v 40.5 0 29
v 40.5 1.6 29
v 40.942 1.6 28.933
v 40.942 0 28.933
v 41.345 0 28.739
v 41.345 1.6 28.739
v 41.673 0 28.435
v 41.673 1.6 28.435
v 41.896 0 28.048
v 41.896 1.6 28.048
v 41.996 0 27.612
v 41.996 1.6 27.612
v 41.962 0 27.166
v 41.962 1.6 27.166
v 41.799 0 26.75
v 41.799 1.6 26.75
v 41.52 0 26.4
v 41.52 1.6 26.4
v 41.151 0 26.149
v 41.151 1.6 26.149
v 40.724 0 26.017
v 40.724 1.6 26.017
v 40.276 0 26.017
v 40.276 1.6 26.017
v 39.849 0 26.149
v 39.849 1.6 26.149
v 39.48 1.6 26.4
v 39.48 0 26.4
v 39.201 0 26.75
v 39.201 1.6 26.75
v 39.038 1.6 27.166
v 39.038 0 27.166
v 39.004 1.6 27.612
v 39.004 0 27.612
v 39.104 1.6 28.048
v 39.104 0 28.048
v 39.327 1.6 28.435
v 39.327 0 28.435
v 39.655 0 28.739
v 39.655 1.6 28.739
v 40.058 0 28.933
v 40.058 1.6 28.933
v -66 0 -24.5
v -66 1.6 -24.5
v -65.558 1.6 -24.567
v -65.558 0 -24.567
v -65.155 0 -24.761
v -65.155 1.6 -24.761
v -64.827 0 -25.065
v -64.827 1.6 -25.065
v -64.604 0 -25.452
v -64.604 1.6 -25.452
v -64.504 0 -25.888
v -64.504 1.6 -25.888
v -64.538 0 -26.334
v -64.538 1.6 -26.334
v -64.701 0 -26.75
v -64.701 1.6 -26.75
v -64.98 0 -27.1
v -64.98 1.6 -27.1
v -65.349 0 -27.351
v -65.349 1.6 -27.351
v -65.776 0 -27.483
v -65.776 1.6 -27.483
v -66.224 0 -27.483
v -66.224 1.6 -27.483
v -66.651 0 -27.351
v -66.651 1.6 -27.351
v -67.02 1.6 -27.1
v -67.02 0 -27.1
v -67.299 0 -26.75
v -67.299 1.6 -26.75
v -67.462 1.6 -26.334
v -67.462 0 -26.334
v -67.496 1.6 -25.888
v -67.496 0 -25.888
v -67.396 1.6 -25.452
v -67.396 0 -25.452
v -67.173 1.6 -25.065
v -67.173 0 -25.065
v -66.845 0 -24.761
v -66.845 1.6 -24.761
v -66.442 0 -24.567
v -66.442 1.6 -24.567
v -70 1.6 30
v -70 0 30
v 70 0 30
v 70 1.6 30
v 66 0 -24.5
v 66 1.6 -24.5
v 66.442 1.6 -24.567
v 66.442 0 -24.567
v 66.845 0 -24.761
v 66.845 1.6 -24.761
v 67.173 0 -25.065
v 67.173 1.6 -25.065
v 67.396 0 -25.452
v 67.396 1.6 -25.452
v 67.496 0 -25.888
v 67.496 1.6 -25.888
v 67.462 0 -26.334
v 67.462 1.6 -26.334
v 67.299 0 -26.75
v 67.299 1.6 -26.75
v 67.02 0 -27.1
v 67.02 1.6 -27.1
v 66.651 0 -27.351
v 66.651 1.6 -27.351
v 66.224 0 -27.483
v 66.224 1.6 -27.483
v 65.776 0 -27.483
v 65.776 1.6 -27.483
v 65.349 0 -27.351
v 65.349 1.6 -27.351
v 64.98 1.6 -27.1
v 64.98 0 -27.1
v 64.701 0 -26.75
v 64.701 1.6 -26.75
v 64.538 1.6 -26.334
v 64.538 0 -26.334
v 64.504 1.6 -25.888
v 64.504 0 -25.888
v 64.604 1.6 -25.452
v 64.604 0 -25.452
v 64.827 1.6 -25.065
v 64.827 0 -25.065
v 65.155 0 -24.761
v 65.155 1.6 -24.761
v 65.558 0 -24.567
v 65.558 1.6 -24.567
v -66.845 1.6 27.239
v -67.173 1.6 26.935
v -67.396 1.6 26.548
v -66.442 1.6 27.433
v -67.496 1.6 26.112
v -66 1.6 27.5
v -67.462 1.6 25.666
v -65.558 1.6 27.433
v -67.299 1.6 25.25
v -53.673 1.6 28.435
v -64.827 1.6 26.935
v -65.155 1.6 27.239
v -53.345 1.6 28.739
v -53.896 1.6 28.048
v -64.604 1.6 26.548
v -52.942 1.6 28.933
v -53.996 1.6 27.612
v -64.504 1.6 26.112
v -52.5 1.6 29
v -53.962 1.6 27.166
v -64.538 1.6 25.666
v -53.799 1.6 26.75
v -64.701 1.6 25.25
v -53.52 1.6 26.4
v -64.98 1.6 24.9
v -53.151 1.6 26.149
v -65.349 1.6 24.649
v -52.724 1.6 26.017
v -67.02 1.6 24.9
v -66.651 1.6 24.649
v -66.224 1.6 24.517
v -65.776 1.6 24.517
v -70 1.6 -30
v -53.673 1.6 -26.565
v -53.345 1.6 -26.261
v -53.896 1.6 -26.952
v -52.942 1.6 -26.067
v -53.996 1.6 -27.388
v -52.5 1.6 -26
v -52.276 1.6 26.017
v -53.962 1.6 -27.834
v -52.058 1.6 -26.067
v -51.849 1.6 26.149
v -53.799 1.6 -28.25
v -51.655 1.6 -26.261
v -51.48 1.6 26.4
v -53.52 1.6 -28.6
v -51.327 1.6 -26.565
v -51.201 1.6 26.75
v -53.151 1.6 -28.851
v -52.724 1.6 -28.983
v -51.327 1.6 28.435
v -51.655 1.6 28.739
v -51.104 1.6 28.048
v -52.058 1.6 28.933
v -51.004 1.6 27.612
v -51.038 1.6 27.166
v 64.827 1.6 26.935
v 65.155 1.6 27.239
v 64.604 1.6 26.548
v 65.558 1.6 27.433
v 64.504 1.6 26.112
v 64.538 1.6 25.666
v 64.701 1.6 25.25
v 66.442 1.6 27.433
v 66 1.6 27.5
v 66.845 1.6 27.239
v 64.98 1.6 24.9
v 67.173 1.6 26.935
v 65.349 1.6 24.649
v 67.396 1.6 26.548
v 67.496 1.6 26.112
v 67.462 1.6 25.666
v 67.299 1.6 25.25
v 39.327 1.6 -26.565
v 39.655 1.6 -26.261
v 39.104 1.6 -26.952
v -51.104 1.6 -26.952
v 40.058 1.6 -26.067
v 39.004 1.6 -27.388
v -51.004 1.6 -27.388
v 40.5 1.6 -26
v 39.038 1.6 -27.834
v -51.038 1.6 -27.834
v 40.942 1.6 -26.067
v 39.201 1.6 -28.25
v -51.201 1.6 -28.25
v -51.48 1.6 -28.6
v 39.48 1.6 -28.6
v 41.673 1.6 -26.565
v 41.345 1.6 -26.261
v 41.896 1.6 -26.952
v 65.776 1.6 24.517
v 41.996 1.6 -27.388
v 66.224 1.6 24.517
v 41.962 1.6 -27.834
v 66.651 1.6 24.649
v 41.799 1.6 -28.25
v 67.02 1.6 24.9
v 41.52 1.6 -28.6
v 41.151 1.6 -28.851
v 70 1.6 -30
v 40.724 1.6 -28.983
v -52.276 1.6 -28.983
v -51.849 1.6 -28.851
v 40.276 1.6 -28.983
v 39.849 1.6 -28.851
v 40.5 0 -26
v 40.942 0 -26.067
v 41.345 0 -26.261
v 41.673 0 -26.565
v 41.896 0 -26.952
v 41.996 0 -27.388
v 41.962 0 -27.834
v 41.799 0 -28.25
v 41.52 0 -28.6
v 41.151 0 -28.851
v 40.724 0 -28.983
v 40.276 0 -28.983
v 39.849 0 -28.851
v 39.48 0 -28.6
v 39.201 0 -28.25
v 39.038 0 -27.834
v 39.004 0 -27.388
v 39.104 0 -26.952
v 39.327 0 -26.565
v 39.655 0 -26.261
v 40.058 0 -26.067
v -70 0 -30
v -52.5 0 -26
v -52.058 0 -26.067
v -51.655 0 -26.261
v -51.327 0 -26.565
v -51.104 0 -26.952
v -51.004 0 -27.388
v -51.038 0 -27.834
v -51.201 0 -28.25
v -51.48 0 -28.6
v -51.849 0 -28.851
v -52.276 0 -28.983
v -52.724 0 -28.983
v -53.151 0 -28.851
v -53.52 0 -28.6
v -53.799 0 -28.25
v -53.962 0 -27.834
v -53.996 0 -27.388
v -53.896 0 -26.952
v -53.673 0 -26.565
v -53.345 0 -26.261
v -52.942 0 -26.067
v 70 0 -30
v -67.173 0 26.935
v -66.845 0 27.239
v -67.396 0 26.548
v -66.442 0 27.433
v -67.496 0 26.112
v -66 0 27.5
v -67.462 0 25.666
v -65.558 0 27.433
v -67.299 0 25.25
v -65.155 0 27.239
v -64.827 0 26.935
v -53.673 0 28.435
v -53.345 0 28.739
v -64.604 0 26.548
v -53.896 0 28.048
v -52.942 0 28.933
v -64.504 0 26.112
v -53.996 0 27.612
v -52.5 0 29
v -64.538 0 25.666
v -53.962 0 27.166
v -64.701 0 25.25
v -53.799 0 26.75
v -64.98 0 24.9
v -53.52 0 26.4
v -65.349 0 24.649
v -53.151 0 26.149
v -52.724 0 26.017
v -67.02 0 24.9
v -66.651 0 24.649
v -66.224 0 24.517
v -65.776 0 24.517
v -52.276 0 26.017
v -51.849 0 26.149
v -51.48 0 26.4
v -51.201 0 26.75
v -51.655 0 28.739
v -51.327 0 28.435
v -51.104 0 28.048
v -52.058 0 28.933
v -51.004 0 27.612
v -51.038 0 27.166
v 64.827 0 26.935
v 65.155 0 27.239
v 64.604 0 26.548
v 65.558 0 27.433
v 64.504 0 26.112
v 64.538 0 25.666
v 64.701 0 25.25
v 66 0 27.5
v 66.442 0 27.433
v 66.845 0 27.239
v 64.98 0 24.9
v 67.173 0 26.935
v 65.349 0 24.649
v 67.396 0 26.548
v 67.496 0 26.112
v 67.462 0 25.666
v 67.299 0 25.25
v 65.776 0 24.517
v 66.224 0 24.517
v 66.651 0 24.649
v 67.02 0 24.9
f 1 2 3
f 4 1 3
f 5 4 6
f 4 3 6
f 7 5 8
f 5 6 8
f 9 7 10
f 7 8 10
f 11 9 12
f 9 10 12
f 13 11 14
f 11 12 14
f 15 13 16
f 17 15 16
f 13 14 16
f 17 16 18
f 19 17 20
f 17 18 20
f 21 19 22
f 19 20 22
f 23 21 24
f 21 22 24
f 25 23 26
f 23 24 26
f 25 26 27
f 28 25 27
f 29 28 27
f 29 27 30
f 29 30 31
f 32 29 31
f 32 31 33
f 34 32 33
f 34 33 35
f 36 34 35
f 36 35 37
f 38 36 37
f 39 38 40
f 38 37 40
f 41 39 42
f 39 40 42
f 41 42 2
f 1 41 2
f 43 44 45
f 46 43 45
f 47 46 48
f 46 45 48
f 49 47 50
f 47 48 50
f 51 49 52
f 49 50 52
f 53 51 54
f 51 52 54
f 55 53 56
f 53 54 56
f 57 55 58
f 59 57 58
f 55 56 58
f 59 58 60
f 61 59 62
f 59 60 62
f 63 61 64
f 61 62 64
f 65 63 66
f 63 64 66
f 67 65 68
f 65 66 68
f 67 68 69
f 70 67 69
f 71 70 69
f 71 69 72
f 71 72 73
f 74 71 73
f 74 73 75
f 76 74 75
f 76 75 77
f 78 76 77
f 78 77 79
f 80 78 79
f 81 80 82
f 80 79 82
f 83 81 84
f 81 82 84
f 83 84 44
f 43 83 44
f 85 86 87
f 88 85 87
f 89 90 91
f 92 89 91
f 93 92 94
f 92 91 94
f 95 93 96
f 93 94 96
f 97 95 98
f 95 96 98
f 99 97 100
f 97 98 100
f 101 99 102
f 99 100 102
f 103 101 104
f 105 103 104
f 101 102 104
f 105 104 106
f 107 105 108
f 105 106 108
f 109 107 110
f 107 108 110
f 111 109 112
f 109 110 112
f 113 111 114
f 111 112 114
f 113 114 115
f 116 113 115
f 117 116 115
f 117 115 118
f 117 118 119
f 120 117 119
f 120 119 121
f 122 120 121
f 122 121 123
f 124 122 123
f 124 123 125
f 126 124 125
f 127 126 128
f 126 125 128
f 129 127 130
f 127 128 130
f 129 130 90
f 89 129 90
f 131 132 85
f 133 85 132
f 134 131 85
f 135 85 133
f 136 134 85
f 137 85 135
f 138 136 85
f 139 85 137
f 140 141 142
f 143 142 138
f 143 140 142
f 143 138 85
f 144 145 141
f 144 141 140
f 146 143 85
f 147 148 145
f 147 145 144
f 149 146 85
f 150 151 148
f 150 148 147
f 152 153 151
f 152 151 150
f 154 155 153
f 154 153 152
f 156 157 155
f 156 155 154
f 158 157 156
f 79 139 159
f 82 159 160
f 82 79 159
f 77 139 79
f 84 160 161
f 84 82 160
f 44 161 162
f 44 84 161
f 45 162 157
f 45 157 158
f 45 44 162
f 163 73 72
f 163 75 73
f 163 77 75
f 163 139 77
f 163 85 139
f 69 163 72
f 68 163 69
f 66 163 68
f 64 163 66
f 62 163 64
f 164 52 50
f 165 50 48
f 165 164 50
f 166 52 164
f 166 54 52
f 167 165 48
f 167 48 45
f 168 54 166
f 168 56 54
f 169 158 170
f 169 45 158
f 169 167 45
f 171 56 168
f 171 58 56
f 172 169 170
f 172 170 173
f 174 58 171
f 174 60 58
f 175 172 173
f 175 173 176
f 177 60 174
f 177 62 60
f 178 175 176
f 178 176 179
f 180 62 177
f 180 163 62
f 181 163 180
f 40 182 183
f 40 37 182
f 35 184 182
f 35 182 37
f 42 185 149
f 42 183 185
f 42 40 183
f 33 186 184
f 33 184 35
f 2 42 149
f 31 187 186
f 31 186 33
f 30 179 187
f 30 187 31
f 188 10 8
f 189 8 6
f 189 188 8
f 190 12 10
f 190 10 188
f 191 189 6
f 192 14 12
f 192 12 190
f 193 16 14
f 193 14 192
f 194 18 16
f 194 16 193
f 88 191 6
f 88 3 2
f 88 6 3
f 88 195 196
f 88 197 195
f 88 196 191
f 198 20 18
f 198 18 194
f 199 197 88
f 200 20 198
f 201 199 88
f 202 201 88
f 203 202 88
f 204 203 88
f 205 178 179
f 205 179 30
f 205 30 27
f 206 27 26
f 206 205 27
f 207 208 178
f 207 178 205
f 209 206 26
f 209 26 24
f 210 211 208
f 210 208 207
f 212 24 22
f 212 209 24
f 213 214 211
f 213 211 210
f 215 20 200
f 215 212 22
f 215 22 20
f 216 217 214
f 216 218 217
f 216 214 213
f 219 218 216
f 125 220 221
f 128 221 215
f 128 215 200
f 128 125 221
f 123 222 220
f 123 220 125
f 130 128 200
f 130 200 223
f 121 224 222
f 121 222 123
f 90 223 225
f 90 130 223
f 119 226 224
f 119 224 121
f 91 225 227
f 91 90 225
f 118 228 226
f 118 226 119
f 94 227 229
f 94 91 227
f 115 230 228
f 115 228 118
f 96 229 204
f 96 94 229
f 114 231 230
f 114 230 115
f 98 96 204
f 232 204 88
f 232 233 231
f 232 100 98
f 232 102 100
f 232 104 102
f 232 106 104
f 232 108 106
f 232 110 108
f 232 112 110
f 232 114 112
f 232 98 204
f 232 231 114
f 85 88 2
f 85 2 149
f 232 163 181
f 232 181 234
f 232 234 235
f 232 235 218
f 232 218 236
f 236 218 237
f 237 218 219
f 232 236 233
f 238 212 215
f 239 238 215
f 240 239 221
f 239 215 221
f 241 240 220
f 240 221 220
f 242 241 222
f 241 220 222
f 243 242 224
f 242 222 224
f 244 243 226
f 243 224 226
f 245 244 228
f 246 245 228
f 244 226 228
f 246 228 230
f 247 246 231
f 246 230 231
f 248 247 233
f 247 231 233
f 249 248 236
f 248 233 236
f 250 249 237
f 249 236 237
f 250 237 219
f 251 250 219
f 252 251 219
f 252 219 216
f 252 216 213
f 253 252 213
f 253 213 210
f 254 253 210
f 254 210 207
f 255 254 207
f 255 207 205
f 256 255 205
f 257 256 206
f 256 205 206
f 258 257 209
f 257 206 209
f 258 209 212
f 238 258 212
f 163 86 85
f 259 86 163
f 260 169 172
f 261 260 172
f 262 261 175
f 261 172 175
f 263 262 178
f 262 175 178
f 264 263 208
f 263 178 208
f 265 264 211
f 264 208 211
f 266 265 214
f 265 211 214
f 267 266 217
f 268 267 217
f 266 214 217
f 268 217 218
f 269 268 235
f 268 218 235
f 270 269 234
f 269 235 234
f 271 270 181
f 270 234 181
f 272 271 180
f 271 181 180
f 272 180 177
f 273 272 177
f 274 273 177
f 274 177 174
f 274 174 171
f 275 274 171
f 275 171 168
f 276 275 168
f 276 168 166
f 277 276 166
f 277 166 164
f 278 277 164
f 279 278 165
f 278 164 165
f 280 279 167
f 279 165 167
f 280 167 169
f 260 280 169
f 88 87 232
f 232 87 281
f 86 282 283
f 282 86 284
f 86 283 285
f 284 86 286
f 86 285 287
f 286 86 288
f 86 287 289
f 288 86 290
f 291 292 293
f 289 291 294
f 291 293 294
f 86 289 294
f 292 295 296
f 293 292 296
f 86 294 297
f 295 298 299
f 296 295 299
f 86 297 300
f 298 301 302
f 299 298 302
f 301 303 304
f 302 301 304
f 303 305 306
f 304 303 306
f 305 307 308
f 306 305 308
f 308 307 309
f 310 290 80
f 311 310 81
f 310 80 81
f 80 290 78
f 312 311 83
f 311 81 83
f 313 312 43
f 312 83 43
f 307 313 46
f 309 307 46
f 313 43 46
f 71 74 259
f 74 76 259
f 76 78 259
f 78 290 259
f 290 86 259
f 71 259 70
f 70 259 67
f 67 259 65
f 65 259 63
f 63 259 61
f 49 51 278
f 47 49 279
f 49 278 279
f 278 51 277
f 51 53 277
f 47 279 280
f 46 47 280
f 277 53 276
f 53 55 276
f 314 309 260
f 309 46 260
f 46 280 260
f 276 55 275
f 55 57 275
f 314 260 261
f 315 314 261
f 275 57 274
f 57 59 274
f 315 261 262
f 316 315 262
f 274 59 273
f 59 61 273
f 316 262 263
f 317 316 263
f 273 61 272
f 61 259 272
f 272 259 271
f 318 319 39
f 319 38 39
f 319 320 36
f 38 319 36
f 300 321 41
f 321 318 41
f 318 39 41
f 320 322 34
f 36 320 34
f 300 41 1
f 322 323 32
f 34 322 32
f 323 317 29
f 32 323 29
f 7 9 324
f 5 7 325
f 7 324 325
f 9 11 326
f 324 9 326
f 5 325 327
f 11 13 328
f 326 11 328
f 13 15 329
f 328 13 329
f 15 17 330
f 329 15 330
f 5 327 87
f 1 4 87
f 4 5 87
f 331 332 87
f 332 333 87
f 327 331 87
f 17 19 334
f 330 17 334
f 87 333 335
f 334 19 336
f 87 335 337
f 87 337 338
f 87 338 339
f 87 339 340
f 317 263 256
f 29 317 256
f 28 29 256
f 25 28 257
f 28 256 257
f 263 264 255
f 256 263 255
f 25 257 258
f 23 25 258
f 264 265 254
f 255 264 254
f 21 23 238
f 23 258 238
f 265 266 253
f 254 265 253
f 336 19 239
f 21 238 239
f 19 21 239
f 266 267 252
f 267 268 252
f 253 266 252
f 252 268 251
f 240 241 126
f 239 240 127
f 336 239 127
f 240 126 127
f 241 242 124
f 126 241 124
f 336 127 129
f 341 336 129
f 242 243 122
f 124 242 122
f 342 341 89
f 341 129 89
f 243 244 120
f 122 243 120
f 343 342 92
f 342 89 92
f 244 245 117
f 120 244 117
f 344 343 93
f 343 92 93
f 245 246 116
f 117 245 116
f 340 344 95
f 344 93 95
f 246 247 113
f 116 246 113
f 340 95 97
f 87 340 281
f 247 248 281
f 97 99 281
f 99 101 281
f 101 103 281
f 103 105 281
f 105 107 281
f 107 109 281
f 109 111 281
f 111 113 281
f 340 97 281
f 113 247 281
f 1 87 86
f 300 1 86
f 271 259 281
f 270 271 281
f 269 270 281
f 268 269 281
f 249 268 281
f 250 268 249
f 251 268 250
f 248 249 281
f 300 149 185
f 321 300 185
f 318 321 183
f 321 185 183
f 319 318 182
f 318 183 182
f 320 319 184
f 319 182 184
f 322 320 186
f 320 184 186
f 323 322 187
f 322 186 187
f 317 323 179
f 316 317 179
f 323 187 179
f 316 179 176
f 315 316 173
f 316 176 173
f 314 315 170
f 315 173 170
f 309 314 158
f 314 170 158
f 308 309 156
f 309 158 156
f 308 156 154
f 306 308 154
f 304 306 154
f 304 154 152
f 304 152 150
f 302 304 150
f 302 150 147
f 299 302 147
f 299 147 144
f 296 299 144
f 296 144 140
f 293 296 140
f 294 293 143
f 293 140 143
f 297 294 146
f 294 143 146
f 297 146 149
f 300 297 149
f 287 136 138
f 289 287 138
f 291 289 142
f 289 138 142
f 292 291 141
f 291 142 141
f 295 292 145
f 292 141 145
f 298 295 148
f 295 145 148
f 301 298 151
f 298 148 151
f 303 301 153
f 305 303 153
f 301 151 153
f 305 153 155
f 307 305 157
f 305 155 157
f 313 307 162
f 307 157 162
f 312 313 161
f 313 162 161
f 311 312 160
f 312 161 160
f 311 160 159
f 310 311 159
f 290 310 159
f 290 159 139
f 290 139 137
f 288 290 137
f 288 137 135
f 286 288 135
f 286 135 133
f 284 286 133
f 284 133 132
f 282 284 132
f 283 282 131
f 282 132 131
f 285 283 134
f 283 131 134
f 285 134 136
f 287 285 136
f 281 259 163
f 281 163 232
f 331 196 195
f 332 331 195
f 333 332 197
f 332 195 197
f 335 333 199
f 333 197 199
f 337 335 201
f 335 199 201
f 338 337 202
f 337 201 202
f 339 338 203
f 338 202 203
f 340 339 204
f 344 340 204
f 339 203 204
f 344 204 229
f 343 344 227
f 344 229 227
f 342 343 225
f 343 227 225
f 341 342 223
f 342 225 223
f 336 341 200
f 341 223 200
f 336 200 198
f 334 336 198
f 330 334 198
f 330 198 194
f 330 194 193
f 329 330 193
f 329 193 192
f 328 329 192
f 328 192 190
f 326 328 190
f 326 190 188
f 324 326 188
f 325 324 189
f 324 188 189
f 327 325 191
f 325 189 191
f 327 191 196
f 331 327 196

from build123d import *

# Parameters (mm, degrees)
SKETCH_1_W          = 140
SKETCH_1_H          = 60
EXTRUDE_1_DEPTH     = 1.6
SKETCH_2_R          = 1.5
CUT_EXTRUDE_1_DEPTH = 1.6
SKETCH_3_R          = 1.5
CUT_EXTRUDE_2_DEPTH = 1.6


with BuildPart() as part:
    # Эскиз1 → Бобышка-Вытянуть1 (new body)
    with BuildSketch(Plane(origin=(0, 0, 0), x_dir=(1, 0, 0), z_dir=(0, 1, 0))):
        Rectangle(SKETCH_1_W, SKETCH_1_H)
    extrude(amount=EXTRUDE_1_DEPTH)

    # Эскиз2 → Вырез-Вытянуть1 (cut)
    with BuildSketch(Plane(origin=(0, 1.6, 0), x_dir=(1, 0, 0), z_dir=(0, 1, 0))):
        with Locations(Location((-66, 26, 0), (0, 0, 270))):
            Circle(SKETCH_2_R)
        with Locations(Location((-66, -26, 0), (0, 0, 270))):
            Circle(SKETCH_2_R)
        with Locations(Location((66, -26, 0), (0, 0, 270))):
            Circle(SKETCH_2_R)
        with Locations(Location((66, 26, 0), (0, 0, 270))):
            Circle(SKETCH_2_R)
    extrude(amount=-CUT_EXTRUDE_1_DEPTH, mode=Mode.SUBTRACT)

    # Эскиз3 → Вырез-Вытянуть2 (cut)
    with BuildSketch(Plane(origin=(0, 1.6, 0), x_dir=(1, 0, 0), z_dir=(0, 1, 0))):
        with Locations(Location((-52.5, 27.5, 0), (0, 0, 270))):
            Circle(SKETCH_3_R)
        with Locations(Location((-52.5, -27.5, 0), (0, 0, 270))):
            Circle(SKETCH_3_R)
        with Locations(Location((40.5, 27.5, 0), (0, 0, 270))):
            Circle(SKETCH_3_R)
        with Locations(Location((40.5, -27.5, 0), (0, 0, 270))):
            Circle(SKETCH_3_R)
    extrude(amount=-CUT_EXTRUDE_2_DEPTH, mode=Mode.SUBTRACT)


solid = part.part
